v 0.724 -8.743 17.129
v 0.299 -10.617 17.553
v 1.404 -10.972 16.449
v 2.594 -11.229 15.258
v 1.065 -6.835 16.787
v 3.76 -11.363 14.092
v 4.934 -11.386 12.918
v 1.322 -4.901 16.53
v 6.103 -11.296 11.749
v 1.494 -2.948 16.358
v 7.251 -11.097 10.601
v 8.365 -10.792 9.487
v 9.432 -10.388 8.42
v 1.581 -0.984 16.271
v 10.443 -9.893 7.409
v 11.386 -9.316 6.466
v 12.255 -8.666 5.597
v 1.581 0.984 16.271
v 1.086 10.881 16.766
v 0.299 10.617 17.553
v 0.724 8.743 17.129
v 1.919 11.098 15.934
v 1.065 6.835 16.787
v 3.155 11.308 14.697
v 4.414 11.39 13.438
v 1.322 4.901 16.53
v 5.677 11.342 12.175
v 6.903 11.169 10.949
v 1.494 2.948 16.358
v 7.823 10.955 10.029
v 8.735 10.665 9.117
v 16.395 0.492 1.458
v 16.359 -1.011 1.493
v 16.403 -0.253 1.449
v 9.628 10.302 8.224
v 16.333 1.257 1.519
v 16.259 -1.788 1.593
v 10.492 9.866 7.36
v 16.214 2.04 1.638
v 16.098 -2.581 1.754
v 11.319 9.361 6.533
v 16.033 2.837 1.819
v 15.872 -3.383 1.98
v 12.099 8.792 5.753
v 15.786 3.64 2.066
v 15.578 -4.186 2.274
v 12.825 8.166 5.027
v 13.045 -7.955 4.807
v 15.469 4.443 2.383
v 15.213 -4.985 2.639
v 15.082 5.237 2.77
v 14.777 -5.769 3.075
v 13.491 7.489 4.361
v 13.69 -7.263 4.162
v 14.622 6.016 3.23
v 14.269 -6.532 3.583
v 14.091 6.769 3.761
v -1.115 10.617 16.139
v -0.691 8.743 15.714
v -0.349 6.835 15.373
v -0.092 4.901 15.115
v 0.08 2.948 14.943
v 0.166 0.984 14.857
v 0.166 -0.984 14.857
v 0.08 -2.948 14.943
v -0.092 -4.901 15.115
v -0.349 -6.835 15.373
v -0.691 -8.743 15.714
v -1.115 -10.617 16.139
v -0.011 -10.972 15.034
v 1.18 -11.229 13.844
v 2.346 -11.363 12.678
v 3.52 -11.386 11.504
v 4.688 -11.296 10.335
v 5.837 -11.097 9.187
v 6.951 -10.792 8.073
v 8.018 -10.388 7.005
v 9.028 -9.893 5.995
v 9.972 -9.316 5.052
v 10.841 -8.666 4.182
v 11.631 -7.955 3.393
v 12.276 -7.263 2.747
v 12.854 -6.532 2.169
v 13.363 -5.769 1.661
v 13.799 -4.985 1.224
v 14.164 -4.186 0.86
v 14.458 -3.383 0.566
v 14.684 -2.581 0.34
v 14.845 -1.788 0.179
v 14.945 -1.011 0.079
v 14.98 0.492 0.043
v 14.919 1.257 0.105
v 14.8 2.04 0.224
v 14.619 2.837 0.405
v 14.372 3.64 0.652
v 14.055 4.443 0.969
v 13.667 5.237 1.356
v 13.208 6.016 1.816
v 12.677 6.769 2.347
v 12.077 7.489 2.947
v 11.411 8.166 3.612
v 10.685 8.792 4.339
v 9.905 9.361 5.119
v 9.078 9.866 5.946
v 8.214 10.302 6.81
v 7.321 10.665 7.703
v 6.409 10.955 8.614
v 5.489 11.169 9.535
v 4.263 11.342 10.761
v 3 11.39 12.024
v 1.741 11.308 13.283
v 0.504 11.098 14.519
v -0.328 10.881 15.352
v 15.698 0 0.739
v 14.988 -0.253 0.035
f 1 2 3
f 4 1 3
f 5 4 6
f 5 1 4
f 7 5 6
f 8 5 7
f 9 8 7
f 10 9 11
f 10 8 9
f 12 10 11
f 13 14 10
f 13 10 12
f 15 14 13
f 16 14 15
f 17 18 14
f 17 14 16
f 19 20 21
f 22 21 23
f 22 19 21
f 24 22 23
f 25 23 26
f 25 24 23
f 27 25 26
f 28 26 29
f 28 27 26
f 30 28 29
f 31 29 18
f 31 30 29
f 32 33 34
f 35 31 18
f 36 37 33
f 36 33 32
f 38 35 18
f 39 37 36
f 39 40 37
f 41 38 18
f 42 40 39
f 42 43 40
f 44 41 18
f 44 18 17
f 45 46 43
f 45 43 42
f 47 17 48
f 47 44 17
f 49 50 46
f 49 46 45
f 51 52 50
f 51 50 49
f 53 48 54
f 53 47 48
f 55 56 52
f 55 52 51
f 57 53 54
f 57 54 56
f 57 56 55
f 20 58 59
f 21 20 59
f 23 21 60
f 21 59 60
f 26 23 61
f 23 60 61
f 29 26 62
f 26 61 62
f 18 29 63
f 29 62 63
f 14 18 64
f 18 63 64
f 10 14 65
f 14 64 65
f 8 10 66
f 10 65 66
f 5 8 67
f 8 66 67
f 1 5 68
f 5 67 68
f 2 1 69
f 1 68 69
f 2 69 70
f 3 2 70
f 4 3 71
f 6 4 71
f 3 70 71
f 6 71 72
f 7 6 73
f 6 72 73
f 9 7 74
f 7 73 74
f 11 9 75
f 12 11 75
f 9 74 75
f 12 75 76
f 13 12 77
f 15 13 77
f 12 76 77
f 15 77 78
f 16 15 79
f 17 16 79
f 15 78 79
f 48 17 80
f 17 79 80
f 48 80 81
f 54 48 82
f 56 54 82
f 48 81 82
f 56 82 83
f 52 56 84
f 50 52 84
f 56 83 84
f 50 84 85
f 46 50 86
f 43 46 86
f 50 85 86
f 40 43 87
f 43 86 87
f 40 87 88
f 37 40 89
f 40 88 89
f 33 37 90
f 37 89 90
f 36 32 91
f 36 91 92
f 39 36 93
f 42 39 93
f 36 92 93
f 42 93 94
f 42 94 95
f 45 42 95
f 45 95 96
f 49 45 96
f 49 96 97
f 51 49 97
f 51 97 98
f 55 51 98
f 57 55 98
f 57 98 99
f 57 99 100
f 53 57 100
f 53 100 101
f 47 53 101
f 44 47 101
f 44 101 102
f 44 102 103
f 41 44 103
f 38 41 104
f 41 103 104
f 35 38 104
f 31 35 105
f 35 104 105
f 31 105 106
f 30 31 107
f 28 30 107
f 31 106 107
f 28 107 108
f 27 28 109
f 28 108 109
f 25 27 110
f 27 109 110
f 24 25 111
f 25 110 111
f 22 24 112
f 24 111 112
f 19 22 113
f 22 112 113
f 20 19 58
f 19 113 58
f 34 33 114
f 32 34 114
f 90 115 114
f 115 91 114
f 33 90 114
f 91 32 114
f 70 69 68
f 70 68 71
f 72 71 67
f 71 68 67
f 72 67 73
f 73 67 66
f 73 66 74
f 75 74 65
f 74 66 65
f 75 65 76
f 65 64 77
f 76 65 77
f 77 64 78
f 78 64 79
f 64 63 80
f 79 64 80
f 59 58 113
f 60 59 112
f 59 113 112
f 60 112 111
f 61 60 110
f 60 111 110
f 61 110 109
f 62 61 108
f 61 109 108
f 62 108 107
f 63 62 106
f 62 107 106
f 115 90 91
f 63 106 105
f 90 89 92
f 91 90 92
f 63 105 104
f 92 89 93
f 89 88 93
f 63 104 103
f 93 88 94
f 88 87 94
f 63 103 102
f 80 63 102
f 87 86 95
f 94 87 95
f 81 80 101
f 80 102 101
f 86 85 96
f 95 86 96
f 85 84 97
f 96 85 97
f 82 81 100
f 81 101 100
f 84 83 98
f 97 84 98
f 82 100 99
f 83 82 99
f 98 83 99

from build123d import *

# Parameters (mm, degrees)
F2_W     = 51.1
F2_H     = 70
F5_DEPTH = 25
F8_DEPTH = 2


with BuildPart() as f1:
    # F0 (on Front) → F1 (revolve)
    with BuildSketch(Plane.XZ):
        Polygon((-18, 0), (-15, 0), (0, 55.980762), (0, 67.176915), align=None)
    revolve(axis=Axis((0, 0, -5.671357), (0, 0, -1)))

    # F2 (on Front) → F3 (revolve, cut)
    with BuildSketch(Plane.XZ):
        with Locations((-25.55, 35)):
            Rectangle(F2_W, F2_H)
    revolve(axis=Axis((-51.1, 0, 35), (0, 0, 1)), mode=Mode.SUBTRACT)


with BuildPart() as f5:
    # F4 (on Front) → F5 (new body, symmetric)
    with BuildSketch(Plane.XZ):
        Polygon((-5.680286, 19.289707), (13.60942, 0), (15.023634, 0), (-4.97318, 19.996813), align=None)
    extrude(amount=F5_DEPTH, both=True)

    # F6: cut F1
    add(f1.part, mode=Mode.SUBTRACT)


with BuildPart() as f8:
    # F7 (on face) → F8 (new body)
    with BuildSketch(Plane(origin=(7.511817, 0, 7.511817), x_dir=(0.707107, 0, -0.707107), z_dir=(0.707107, 0, 0.707107))):
        with BuildLine():
            ThreePointArc((-12.200382, 10.617221), (-10.372685, 0), (-12.200382, -10.617221))
            add(Edge.make_bspline(
                [(-12.200382, -10.617221), (10.577657, -16.648397), (10.577657, 0), (10.577657, 16.648397), (-12.200382, 10.617221)],
                knots=[4.341689, 4.341689, 4.341689, 6.283185, 6.283185, 8.224681, 8.224681, 8.224681], degree=2, weights=[1, 0.564682, 1, 0.564682, 1]))
        make_face()
    extrude(amount=F8_DEPTH)


solid = f8.part
